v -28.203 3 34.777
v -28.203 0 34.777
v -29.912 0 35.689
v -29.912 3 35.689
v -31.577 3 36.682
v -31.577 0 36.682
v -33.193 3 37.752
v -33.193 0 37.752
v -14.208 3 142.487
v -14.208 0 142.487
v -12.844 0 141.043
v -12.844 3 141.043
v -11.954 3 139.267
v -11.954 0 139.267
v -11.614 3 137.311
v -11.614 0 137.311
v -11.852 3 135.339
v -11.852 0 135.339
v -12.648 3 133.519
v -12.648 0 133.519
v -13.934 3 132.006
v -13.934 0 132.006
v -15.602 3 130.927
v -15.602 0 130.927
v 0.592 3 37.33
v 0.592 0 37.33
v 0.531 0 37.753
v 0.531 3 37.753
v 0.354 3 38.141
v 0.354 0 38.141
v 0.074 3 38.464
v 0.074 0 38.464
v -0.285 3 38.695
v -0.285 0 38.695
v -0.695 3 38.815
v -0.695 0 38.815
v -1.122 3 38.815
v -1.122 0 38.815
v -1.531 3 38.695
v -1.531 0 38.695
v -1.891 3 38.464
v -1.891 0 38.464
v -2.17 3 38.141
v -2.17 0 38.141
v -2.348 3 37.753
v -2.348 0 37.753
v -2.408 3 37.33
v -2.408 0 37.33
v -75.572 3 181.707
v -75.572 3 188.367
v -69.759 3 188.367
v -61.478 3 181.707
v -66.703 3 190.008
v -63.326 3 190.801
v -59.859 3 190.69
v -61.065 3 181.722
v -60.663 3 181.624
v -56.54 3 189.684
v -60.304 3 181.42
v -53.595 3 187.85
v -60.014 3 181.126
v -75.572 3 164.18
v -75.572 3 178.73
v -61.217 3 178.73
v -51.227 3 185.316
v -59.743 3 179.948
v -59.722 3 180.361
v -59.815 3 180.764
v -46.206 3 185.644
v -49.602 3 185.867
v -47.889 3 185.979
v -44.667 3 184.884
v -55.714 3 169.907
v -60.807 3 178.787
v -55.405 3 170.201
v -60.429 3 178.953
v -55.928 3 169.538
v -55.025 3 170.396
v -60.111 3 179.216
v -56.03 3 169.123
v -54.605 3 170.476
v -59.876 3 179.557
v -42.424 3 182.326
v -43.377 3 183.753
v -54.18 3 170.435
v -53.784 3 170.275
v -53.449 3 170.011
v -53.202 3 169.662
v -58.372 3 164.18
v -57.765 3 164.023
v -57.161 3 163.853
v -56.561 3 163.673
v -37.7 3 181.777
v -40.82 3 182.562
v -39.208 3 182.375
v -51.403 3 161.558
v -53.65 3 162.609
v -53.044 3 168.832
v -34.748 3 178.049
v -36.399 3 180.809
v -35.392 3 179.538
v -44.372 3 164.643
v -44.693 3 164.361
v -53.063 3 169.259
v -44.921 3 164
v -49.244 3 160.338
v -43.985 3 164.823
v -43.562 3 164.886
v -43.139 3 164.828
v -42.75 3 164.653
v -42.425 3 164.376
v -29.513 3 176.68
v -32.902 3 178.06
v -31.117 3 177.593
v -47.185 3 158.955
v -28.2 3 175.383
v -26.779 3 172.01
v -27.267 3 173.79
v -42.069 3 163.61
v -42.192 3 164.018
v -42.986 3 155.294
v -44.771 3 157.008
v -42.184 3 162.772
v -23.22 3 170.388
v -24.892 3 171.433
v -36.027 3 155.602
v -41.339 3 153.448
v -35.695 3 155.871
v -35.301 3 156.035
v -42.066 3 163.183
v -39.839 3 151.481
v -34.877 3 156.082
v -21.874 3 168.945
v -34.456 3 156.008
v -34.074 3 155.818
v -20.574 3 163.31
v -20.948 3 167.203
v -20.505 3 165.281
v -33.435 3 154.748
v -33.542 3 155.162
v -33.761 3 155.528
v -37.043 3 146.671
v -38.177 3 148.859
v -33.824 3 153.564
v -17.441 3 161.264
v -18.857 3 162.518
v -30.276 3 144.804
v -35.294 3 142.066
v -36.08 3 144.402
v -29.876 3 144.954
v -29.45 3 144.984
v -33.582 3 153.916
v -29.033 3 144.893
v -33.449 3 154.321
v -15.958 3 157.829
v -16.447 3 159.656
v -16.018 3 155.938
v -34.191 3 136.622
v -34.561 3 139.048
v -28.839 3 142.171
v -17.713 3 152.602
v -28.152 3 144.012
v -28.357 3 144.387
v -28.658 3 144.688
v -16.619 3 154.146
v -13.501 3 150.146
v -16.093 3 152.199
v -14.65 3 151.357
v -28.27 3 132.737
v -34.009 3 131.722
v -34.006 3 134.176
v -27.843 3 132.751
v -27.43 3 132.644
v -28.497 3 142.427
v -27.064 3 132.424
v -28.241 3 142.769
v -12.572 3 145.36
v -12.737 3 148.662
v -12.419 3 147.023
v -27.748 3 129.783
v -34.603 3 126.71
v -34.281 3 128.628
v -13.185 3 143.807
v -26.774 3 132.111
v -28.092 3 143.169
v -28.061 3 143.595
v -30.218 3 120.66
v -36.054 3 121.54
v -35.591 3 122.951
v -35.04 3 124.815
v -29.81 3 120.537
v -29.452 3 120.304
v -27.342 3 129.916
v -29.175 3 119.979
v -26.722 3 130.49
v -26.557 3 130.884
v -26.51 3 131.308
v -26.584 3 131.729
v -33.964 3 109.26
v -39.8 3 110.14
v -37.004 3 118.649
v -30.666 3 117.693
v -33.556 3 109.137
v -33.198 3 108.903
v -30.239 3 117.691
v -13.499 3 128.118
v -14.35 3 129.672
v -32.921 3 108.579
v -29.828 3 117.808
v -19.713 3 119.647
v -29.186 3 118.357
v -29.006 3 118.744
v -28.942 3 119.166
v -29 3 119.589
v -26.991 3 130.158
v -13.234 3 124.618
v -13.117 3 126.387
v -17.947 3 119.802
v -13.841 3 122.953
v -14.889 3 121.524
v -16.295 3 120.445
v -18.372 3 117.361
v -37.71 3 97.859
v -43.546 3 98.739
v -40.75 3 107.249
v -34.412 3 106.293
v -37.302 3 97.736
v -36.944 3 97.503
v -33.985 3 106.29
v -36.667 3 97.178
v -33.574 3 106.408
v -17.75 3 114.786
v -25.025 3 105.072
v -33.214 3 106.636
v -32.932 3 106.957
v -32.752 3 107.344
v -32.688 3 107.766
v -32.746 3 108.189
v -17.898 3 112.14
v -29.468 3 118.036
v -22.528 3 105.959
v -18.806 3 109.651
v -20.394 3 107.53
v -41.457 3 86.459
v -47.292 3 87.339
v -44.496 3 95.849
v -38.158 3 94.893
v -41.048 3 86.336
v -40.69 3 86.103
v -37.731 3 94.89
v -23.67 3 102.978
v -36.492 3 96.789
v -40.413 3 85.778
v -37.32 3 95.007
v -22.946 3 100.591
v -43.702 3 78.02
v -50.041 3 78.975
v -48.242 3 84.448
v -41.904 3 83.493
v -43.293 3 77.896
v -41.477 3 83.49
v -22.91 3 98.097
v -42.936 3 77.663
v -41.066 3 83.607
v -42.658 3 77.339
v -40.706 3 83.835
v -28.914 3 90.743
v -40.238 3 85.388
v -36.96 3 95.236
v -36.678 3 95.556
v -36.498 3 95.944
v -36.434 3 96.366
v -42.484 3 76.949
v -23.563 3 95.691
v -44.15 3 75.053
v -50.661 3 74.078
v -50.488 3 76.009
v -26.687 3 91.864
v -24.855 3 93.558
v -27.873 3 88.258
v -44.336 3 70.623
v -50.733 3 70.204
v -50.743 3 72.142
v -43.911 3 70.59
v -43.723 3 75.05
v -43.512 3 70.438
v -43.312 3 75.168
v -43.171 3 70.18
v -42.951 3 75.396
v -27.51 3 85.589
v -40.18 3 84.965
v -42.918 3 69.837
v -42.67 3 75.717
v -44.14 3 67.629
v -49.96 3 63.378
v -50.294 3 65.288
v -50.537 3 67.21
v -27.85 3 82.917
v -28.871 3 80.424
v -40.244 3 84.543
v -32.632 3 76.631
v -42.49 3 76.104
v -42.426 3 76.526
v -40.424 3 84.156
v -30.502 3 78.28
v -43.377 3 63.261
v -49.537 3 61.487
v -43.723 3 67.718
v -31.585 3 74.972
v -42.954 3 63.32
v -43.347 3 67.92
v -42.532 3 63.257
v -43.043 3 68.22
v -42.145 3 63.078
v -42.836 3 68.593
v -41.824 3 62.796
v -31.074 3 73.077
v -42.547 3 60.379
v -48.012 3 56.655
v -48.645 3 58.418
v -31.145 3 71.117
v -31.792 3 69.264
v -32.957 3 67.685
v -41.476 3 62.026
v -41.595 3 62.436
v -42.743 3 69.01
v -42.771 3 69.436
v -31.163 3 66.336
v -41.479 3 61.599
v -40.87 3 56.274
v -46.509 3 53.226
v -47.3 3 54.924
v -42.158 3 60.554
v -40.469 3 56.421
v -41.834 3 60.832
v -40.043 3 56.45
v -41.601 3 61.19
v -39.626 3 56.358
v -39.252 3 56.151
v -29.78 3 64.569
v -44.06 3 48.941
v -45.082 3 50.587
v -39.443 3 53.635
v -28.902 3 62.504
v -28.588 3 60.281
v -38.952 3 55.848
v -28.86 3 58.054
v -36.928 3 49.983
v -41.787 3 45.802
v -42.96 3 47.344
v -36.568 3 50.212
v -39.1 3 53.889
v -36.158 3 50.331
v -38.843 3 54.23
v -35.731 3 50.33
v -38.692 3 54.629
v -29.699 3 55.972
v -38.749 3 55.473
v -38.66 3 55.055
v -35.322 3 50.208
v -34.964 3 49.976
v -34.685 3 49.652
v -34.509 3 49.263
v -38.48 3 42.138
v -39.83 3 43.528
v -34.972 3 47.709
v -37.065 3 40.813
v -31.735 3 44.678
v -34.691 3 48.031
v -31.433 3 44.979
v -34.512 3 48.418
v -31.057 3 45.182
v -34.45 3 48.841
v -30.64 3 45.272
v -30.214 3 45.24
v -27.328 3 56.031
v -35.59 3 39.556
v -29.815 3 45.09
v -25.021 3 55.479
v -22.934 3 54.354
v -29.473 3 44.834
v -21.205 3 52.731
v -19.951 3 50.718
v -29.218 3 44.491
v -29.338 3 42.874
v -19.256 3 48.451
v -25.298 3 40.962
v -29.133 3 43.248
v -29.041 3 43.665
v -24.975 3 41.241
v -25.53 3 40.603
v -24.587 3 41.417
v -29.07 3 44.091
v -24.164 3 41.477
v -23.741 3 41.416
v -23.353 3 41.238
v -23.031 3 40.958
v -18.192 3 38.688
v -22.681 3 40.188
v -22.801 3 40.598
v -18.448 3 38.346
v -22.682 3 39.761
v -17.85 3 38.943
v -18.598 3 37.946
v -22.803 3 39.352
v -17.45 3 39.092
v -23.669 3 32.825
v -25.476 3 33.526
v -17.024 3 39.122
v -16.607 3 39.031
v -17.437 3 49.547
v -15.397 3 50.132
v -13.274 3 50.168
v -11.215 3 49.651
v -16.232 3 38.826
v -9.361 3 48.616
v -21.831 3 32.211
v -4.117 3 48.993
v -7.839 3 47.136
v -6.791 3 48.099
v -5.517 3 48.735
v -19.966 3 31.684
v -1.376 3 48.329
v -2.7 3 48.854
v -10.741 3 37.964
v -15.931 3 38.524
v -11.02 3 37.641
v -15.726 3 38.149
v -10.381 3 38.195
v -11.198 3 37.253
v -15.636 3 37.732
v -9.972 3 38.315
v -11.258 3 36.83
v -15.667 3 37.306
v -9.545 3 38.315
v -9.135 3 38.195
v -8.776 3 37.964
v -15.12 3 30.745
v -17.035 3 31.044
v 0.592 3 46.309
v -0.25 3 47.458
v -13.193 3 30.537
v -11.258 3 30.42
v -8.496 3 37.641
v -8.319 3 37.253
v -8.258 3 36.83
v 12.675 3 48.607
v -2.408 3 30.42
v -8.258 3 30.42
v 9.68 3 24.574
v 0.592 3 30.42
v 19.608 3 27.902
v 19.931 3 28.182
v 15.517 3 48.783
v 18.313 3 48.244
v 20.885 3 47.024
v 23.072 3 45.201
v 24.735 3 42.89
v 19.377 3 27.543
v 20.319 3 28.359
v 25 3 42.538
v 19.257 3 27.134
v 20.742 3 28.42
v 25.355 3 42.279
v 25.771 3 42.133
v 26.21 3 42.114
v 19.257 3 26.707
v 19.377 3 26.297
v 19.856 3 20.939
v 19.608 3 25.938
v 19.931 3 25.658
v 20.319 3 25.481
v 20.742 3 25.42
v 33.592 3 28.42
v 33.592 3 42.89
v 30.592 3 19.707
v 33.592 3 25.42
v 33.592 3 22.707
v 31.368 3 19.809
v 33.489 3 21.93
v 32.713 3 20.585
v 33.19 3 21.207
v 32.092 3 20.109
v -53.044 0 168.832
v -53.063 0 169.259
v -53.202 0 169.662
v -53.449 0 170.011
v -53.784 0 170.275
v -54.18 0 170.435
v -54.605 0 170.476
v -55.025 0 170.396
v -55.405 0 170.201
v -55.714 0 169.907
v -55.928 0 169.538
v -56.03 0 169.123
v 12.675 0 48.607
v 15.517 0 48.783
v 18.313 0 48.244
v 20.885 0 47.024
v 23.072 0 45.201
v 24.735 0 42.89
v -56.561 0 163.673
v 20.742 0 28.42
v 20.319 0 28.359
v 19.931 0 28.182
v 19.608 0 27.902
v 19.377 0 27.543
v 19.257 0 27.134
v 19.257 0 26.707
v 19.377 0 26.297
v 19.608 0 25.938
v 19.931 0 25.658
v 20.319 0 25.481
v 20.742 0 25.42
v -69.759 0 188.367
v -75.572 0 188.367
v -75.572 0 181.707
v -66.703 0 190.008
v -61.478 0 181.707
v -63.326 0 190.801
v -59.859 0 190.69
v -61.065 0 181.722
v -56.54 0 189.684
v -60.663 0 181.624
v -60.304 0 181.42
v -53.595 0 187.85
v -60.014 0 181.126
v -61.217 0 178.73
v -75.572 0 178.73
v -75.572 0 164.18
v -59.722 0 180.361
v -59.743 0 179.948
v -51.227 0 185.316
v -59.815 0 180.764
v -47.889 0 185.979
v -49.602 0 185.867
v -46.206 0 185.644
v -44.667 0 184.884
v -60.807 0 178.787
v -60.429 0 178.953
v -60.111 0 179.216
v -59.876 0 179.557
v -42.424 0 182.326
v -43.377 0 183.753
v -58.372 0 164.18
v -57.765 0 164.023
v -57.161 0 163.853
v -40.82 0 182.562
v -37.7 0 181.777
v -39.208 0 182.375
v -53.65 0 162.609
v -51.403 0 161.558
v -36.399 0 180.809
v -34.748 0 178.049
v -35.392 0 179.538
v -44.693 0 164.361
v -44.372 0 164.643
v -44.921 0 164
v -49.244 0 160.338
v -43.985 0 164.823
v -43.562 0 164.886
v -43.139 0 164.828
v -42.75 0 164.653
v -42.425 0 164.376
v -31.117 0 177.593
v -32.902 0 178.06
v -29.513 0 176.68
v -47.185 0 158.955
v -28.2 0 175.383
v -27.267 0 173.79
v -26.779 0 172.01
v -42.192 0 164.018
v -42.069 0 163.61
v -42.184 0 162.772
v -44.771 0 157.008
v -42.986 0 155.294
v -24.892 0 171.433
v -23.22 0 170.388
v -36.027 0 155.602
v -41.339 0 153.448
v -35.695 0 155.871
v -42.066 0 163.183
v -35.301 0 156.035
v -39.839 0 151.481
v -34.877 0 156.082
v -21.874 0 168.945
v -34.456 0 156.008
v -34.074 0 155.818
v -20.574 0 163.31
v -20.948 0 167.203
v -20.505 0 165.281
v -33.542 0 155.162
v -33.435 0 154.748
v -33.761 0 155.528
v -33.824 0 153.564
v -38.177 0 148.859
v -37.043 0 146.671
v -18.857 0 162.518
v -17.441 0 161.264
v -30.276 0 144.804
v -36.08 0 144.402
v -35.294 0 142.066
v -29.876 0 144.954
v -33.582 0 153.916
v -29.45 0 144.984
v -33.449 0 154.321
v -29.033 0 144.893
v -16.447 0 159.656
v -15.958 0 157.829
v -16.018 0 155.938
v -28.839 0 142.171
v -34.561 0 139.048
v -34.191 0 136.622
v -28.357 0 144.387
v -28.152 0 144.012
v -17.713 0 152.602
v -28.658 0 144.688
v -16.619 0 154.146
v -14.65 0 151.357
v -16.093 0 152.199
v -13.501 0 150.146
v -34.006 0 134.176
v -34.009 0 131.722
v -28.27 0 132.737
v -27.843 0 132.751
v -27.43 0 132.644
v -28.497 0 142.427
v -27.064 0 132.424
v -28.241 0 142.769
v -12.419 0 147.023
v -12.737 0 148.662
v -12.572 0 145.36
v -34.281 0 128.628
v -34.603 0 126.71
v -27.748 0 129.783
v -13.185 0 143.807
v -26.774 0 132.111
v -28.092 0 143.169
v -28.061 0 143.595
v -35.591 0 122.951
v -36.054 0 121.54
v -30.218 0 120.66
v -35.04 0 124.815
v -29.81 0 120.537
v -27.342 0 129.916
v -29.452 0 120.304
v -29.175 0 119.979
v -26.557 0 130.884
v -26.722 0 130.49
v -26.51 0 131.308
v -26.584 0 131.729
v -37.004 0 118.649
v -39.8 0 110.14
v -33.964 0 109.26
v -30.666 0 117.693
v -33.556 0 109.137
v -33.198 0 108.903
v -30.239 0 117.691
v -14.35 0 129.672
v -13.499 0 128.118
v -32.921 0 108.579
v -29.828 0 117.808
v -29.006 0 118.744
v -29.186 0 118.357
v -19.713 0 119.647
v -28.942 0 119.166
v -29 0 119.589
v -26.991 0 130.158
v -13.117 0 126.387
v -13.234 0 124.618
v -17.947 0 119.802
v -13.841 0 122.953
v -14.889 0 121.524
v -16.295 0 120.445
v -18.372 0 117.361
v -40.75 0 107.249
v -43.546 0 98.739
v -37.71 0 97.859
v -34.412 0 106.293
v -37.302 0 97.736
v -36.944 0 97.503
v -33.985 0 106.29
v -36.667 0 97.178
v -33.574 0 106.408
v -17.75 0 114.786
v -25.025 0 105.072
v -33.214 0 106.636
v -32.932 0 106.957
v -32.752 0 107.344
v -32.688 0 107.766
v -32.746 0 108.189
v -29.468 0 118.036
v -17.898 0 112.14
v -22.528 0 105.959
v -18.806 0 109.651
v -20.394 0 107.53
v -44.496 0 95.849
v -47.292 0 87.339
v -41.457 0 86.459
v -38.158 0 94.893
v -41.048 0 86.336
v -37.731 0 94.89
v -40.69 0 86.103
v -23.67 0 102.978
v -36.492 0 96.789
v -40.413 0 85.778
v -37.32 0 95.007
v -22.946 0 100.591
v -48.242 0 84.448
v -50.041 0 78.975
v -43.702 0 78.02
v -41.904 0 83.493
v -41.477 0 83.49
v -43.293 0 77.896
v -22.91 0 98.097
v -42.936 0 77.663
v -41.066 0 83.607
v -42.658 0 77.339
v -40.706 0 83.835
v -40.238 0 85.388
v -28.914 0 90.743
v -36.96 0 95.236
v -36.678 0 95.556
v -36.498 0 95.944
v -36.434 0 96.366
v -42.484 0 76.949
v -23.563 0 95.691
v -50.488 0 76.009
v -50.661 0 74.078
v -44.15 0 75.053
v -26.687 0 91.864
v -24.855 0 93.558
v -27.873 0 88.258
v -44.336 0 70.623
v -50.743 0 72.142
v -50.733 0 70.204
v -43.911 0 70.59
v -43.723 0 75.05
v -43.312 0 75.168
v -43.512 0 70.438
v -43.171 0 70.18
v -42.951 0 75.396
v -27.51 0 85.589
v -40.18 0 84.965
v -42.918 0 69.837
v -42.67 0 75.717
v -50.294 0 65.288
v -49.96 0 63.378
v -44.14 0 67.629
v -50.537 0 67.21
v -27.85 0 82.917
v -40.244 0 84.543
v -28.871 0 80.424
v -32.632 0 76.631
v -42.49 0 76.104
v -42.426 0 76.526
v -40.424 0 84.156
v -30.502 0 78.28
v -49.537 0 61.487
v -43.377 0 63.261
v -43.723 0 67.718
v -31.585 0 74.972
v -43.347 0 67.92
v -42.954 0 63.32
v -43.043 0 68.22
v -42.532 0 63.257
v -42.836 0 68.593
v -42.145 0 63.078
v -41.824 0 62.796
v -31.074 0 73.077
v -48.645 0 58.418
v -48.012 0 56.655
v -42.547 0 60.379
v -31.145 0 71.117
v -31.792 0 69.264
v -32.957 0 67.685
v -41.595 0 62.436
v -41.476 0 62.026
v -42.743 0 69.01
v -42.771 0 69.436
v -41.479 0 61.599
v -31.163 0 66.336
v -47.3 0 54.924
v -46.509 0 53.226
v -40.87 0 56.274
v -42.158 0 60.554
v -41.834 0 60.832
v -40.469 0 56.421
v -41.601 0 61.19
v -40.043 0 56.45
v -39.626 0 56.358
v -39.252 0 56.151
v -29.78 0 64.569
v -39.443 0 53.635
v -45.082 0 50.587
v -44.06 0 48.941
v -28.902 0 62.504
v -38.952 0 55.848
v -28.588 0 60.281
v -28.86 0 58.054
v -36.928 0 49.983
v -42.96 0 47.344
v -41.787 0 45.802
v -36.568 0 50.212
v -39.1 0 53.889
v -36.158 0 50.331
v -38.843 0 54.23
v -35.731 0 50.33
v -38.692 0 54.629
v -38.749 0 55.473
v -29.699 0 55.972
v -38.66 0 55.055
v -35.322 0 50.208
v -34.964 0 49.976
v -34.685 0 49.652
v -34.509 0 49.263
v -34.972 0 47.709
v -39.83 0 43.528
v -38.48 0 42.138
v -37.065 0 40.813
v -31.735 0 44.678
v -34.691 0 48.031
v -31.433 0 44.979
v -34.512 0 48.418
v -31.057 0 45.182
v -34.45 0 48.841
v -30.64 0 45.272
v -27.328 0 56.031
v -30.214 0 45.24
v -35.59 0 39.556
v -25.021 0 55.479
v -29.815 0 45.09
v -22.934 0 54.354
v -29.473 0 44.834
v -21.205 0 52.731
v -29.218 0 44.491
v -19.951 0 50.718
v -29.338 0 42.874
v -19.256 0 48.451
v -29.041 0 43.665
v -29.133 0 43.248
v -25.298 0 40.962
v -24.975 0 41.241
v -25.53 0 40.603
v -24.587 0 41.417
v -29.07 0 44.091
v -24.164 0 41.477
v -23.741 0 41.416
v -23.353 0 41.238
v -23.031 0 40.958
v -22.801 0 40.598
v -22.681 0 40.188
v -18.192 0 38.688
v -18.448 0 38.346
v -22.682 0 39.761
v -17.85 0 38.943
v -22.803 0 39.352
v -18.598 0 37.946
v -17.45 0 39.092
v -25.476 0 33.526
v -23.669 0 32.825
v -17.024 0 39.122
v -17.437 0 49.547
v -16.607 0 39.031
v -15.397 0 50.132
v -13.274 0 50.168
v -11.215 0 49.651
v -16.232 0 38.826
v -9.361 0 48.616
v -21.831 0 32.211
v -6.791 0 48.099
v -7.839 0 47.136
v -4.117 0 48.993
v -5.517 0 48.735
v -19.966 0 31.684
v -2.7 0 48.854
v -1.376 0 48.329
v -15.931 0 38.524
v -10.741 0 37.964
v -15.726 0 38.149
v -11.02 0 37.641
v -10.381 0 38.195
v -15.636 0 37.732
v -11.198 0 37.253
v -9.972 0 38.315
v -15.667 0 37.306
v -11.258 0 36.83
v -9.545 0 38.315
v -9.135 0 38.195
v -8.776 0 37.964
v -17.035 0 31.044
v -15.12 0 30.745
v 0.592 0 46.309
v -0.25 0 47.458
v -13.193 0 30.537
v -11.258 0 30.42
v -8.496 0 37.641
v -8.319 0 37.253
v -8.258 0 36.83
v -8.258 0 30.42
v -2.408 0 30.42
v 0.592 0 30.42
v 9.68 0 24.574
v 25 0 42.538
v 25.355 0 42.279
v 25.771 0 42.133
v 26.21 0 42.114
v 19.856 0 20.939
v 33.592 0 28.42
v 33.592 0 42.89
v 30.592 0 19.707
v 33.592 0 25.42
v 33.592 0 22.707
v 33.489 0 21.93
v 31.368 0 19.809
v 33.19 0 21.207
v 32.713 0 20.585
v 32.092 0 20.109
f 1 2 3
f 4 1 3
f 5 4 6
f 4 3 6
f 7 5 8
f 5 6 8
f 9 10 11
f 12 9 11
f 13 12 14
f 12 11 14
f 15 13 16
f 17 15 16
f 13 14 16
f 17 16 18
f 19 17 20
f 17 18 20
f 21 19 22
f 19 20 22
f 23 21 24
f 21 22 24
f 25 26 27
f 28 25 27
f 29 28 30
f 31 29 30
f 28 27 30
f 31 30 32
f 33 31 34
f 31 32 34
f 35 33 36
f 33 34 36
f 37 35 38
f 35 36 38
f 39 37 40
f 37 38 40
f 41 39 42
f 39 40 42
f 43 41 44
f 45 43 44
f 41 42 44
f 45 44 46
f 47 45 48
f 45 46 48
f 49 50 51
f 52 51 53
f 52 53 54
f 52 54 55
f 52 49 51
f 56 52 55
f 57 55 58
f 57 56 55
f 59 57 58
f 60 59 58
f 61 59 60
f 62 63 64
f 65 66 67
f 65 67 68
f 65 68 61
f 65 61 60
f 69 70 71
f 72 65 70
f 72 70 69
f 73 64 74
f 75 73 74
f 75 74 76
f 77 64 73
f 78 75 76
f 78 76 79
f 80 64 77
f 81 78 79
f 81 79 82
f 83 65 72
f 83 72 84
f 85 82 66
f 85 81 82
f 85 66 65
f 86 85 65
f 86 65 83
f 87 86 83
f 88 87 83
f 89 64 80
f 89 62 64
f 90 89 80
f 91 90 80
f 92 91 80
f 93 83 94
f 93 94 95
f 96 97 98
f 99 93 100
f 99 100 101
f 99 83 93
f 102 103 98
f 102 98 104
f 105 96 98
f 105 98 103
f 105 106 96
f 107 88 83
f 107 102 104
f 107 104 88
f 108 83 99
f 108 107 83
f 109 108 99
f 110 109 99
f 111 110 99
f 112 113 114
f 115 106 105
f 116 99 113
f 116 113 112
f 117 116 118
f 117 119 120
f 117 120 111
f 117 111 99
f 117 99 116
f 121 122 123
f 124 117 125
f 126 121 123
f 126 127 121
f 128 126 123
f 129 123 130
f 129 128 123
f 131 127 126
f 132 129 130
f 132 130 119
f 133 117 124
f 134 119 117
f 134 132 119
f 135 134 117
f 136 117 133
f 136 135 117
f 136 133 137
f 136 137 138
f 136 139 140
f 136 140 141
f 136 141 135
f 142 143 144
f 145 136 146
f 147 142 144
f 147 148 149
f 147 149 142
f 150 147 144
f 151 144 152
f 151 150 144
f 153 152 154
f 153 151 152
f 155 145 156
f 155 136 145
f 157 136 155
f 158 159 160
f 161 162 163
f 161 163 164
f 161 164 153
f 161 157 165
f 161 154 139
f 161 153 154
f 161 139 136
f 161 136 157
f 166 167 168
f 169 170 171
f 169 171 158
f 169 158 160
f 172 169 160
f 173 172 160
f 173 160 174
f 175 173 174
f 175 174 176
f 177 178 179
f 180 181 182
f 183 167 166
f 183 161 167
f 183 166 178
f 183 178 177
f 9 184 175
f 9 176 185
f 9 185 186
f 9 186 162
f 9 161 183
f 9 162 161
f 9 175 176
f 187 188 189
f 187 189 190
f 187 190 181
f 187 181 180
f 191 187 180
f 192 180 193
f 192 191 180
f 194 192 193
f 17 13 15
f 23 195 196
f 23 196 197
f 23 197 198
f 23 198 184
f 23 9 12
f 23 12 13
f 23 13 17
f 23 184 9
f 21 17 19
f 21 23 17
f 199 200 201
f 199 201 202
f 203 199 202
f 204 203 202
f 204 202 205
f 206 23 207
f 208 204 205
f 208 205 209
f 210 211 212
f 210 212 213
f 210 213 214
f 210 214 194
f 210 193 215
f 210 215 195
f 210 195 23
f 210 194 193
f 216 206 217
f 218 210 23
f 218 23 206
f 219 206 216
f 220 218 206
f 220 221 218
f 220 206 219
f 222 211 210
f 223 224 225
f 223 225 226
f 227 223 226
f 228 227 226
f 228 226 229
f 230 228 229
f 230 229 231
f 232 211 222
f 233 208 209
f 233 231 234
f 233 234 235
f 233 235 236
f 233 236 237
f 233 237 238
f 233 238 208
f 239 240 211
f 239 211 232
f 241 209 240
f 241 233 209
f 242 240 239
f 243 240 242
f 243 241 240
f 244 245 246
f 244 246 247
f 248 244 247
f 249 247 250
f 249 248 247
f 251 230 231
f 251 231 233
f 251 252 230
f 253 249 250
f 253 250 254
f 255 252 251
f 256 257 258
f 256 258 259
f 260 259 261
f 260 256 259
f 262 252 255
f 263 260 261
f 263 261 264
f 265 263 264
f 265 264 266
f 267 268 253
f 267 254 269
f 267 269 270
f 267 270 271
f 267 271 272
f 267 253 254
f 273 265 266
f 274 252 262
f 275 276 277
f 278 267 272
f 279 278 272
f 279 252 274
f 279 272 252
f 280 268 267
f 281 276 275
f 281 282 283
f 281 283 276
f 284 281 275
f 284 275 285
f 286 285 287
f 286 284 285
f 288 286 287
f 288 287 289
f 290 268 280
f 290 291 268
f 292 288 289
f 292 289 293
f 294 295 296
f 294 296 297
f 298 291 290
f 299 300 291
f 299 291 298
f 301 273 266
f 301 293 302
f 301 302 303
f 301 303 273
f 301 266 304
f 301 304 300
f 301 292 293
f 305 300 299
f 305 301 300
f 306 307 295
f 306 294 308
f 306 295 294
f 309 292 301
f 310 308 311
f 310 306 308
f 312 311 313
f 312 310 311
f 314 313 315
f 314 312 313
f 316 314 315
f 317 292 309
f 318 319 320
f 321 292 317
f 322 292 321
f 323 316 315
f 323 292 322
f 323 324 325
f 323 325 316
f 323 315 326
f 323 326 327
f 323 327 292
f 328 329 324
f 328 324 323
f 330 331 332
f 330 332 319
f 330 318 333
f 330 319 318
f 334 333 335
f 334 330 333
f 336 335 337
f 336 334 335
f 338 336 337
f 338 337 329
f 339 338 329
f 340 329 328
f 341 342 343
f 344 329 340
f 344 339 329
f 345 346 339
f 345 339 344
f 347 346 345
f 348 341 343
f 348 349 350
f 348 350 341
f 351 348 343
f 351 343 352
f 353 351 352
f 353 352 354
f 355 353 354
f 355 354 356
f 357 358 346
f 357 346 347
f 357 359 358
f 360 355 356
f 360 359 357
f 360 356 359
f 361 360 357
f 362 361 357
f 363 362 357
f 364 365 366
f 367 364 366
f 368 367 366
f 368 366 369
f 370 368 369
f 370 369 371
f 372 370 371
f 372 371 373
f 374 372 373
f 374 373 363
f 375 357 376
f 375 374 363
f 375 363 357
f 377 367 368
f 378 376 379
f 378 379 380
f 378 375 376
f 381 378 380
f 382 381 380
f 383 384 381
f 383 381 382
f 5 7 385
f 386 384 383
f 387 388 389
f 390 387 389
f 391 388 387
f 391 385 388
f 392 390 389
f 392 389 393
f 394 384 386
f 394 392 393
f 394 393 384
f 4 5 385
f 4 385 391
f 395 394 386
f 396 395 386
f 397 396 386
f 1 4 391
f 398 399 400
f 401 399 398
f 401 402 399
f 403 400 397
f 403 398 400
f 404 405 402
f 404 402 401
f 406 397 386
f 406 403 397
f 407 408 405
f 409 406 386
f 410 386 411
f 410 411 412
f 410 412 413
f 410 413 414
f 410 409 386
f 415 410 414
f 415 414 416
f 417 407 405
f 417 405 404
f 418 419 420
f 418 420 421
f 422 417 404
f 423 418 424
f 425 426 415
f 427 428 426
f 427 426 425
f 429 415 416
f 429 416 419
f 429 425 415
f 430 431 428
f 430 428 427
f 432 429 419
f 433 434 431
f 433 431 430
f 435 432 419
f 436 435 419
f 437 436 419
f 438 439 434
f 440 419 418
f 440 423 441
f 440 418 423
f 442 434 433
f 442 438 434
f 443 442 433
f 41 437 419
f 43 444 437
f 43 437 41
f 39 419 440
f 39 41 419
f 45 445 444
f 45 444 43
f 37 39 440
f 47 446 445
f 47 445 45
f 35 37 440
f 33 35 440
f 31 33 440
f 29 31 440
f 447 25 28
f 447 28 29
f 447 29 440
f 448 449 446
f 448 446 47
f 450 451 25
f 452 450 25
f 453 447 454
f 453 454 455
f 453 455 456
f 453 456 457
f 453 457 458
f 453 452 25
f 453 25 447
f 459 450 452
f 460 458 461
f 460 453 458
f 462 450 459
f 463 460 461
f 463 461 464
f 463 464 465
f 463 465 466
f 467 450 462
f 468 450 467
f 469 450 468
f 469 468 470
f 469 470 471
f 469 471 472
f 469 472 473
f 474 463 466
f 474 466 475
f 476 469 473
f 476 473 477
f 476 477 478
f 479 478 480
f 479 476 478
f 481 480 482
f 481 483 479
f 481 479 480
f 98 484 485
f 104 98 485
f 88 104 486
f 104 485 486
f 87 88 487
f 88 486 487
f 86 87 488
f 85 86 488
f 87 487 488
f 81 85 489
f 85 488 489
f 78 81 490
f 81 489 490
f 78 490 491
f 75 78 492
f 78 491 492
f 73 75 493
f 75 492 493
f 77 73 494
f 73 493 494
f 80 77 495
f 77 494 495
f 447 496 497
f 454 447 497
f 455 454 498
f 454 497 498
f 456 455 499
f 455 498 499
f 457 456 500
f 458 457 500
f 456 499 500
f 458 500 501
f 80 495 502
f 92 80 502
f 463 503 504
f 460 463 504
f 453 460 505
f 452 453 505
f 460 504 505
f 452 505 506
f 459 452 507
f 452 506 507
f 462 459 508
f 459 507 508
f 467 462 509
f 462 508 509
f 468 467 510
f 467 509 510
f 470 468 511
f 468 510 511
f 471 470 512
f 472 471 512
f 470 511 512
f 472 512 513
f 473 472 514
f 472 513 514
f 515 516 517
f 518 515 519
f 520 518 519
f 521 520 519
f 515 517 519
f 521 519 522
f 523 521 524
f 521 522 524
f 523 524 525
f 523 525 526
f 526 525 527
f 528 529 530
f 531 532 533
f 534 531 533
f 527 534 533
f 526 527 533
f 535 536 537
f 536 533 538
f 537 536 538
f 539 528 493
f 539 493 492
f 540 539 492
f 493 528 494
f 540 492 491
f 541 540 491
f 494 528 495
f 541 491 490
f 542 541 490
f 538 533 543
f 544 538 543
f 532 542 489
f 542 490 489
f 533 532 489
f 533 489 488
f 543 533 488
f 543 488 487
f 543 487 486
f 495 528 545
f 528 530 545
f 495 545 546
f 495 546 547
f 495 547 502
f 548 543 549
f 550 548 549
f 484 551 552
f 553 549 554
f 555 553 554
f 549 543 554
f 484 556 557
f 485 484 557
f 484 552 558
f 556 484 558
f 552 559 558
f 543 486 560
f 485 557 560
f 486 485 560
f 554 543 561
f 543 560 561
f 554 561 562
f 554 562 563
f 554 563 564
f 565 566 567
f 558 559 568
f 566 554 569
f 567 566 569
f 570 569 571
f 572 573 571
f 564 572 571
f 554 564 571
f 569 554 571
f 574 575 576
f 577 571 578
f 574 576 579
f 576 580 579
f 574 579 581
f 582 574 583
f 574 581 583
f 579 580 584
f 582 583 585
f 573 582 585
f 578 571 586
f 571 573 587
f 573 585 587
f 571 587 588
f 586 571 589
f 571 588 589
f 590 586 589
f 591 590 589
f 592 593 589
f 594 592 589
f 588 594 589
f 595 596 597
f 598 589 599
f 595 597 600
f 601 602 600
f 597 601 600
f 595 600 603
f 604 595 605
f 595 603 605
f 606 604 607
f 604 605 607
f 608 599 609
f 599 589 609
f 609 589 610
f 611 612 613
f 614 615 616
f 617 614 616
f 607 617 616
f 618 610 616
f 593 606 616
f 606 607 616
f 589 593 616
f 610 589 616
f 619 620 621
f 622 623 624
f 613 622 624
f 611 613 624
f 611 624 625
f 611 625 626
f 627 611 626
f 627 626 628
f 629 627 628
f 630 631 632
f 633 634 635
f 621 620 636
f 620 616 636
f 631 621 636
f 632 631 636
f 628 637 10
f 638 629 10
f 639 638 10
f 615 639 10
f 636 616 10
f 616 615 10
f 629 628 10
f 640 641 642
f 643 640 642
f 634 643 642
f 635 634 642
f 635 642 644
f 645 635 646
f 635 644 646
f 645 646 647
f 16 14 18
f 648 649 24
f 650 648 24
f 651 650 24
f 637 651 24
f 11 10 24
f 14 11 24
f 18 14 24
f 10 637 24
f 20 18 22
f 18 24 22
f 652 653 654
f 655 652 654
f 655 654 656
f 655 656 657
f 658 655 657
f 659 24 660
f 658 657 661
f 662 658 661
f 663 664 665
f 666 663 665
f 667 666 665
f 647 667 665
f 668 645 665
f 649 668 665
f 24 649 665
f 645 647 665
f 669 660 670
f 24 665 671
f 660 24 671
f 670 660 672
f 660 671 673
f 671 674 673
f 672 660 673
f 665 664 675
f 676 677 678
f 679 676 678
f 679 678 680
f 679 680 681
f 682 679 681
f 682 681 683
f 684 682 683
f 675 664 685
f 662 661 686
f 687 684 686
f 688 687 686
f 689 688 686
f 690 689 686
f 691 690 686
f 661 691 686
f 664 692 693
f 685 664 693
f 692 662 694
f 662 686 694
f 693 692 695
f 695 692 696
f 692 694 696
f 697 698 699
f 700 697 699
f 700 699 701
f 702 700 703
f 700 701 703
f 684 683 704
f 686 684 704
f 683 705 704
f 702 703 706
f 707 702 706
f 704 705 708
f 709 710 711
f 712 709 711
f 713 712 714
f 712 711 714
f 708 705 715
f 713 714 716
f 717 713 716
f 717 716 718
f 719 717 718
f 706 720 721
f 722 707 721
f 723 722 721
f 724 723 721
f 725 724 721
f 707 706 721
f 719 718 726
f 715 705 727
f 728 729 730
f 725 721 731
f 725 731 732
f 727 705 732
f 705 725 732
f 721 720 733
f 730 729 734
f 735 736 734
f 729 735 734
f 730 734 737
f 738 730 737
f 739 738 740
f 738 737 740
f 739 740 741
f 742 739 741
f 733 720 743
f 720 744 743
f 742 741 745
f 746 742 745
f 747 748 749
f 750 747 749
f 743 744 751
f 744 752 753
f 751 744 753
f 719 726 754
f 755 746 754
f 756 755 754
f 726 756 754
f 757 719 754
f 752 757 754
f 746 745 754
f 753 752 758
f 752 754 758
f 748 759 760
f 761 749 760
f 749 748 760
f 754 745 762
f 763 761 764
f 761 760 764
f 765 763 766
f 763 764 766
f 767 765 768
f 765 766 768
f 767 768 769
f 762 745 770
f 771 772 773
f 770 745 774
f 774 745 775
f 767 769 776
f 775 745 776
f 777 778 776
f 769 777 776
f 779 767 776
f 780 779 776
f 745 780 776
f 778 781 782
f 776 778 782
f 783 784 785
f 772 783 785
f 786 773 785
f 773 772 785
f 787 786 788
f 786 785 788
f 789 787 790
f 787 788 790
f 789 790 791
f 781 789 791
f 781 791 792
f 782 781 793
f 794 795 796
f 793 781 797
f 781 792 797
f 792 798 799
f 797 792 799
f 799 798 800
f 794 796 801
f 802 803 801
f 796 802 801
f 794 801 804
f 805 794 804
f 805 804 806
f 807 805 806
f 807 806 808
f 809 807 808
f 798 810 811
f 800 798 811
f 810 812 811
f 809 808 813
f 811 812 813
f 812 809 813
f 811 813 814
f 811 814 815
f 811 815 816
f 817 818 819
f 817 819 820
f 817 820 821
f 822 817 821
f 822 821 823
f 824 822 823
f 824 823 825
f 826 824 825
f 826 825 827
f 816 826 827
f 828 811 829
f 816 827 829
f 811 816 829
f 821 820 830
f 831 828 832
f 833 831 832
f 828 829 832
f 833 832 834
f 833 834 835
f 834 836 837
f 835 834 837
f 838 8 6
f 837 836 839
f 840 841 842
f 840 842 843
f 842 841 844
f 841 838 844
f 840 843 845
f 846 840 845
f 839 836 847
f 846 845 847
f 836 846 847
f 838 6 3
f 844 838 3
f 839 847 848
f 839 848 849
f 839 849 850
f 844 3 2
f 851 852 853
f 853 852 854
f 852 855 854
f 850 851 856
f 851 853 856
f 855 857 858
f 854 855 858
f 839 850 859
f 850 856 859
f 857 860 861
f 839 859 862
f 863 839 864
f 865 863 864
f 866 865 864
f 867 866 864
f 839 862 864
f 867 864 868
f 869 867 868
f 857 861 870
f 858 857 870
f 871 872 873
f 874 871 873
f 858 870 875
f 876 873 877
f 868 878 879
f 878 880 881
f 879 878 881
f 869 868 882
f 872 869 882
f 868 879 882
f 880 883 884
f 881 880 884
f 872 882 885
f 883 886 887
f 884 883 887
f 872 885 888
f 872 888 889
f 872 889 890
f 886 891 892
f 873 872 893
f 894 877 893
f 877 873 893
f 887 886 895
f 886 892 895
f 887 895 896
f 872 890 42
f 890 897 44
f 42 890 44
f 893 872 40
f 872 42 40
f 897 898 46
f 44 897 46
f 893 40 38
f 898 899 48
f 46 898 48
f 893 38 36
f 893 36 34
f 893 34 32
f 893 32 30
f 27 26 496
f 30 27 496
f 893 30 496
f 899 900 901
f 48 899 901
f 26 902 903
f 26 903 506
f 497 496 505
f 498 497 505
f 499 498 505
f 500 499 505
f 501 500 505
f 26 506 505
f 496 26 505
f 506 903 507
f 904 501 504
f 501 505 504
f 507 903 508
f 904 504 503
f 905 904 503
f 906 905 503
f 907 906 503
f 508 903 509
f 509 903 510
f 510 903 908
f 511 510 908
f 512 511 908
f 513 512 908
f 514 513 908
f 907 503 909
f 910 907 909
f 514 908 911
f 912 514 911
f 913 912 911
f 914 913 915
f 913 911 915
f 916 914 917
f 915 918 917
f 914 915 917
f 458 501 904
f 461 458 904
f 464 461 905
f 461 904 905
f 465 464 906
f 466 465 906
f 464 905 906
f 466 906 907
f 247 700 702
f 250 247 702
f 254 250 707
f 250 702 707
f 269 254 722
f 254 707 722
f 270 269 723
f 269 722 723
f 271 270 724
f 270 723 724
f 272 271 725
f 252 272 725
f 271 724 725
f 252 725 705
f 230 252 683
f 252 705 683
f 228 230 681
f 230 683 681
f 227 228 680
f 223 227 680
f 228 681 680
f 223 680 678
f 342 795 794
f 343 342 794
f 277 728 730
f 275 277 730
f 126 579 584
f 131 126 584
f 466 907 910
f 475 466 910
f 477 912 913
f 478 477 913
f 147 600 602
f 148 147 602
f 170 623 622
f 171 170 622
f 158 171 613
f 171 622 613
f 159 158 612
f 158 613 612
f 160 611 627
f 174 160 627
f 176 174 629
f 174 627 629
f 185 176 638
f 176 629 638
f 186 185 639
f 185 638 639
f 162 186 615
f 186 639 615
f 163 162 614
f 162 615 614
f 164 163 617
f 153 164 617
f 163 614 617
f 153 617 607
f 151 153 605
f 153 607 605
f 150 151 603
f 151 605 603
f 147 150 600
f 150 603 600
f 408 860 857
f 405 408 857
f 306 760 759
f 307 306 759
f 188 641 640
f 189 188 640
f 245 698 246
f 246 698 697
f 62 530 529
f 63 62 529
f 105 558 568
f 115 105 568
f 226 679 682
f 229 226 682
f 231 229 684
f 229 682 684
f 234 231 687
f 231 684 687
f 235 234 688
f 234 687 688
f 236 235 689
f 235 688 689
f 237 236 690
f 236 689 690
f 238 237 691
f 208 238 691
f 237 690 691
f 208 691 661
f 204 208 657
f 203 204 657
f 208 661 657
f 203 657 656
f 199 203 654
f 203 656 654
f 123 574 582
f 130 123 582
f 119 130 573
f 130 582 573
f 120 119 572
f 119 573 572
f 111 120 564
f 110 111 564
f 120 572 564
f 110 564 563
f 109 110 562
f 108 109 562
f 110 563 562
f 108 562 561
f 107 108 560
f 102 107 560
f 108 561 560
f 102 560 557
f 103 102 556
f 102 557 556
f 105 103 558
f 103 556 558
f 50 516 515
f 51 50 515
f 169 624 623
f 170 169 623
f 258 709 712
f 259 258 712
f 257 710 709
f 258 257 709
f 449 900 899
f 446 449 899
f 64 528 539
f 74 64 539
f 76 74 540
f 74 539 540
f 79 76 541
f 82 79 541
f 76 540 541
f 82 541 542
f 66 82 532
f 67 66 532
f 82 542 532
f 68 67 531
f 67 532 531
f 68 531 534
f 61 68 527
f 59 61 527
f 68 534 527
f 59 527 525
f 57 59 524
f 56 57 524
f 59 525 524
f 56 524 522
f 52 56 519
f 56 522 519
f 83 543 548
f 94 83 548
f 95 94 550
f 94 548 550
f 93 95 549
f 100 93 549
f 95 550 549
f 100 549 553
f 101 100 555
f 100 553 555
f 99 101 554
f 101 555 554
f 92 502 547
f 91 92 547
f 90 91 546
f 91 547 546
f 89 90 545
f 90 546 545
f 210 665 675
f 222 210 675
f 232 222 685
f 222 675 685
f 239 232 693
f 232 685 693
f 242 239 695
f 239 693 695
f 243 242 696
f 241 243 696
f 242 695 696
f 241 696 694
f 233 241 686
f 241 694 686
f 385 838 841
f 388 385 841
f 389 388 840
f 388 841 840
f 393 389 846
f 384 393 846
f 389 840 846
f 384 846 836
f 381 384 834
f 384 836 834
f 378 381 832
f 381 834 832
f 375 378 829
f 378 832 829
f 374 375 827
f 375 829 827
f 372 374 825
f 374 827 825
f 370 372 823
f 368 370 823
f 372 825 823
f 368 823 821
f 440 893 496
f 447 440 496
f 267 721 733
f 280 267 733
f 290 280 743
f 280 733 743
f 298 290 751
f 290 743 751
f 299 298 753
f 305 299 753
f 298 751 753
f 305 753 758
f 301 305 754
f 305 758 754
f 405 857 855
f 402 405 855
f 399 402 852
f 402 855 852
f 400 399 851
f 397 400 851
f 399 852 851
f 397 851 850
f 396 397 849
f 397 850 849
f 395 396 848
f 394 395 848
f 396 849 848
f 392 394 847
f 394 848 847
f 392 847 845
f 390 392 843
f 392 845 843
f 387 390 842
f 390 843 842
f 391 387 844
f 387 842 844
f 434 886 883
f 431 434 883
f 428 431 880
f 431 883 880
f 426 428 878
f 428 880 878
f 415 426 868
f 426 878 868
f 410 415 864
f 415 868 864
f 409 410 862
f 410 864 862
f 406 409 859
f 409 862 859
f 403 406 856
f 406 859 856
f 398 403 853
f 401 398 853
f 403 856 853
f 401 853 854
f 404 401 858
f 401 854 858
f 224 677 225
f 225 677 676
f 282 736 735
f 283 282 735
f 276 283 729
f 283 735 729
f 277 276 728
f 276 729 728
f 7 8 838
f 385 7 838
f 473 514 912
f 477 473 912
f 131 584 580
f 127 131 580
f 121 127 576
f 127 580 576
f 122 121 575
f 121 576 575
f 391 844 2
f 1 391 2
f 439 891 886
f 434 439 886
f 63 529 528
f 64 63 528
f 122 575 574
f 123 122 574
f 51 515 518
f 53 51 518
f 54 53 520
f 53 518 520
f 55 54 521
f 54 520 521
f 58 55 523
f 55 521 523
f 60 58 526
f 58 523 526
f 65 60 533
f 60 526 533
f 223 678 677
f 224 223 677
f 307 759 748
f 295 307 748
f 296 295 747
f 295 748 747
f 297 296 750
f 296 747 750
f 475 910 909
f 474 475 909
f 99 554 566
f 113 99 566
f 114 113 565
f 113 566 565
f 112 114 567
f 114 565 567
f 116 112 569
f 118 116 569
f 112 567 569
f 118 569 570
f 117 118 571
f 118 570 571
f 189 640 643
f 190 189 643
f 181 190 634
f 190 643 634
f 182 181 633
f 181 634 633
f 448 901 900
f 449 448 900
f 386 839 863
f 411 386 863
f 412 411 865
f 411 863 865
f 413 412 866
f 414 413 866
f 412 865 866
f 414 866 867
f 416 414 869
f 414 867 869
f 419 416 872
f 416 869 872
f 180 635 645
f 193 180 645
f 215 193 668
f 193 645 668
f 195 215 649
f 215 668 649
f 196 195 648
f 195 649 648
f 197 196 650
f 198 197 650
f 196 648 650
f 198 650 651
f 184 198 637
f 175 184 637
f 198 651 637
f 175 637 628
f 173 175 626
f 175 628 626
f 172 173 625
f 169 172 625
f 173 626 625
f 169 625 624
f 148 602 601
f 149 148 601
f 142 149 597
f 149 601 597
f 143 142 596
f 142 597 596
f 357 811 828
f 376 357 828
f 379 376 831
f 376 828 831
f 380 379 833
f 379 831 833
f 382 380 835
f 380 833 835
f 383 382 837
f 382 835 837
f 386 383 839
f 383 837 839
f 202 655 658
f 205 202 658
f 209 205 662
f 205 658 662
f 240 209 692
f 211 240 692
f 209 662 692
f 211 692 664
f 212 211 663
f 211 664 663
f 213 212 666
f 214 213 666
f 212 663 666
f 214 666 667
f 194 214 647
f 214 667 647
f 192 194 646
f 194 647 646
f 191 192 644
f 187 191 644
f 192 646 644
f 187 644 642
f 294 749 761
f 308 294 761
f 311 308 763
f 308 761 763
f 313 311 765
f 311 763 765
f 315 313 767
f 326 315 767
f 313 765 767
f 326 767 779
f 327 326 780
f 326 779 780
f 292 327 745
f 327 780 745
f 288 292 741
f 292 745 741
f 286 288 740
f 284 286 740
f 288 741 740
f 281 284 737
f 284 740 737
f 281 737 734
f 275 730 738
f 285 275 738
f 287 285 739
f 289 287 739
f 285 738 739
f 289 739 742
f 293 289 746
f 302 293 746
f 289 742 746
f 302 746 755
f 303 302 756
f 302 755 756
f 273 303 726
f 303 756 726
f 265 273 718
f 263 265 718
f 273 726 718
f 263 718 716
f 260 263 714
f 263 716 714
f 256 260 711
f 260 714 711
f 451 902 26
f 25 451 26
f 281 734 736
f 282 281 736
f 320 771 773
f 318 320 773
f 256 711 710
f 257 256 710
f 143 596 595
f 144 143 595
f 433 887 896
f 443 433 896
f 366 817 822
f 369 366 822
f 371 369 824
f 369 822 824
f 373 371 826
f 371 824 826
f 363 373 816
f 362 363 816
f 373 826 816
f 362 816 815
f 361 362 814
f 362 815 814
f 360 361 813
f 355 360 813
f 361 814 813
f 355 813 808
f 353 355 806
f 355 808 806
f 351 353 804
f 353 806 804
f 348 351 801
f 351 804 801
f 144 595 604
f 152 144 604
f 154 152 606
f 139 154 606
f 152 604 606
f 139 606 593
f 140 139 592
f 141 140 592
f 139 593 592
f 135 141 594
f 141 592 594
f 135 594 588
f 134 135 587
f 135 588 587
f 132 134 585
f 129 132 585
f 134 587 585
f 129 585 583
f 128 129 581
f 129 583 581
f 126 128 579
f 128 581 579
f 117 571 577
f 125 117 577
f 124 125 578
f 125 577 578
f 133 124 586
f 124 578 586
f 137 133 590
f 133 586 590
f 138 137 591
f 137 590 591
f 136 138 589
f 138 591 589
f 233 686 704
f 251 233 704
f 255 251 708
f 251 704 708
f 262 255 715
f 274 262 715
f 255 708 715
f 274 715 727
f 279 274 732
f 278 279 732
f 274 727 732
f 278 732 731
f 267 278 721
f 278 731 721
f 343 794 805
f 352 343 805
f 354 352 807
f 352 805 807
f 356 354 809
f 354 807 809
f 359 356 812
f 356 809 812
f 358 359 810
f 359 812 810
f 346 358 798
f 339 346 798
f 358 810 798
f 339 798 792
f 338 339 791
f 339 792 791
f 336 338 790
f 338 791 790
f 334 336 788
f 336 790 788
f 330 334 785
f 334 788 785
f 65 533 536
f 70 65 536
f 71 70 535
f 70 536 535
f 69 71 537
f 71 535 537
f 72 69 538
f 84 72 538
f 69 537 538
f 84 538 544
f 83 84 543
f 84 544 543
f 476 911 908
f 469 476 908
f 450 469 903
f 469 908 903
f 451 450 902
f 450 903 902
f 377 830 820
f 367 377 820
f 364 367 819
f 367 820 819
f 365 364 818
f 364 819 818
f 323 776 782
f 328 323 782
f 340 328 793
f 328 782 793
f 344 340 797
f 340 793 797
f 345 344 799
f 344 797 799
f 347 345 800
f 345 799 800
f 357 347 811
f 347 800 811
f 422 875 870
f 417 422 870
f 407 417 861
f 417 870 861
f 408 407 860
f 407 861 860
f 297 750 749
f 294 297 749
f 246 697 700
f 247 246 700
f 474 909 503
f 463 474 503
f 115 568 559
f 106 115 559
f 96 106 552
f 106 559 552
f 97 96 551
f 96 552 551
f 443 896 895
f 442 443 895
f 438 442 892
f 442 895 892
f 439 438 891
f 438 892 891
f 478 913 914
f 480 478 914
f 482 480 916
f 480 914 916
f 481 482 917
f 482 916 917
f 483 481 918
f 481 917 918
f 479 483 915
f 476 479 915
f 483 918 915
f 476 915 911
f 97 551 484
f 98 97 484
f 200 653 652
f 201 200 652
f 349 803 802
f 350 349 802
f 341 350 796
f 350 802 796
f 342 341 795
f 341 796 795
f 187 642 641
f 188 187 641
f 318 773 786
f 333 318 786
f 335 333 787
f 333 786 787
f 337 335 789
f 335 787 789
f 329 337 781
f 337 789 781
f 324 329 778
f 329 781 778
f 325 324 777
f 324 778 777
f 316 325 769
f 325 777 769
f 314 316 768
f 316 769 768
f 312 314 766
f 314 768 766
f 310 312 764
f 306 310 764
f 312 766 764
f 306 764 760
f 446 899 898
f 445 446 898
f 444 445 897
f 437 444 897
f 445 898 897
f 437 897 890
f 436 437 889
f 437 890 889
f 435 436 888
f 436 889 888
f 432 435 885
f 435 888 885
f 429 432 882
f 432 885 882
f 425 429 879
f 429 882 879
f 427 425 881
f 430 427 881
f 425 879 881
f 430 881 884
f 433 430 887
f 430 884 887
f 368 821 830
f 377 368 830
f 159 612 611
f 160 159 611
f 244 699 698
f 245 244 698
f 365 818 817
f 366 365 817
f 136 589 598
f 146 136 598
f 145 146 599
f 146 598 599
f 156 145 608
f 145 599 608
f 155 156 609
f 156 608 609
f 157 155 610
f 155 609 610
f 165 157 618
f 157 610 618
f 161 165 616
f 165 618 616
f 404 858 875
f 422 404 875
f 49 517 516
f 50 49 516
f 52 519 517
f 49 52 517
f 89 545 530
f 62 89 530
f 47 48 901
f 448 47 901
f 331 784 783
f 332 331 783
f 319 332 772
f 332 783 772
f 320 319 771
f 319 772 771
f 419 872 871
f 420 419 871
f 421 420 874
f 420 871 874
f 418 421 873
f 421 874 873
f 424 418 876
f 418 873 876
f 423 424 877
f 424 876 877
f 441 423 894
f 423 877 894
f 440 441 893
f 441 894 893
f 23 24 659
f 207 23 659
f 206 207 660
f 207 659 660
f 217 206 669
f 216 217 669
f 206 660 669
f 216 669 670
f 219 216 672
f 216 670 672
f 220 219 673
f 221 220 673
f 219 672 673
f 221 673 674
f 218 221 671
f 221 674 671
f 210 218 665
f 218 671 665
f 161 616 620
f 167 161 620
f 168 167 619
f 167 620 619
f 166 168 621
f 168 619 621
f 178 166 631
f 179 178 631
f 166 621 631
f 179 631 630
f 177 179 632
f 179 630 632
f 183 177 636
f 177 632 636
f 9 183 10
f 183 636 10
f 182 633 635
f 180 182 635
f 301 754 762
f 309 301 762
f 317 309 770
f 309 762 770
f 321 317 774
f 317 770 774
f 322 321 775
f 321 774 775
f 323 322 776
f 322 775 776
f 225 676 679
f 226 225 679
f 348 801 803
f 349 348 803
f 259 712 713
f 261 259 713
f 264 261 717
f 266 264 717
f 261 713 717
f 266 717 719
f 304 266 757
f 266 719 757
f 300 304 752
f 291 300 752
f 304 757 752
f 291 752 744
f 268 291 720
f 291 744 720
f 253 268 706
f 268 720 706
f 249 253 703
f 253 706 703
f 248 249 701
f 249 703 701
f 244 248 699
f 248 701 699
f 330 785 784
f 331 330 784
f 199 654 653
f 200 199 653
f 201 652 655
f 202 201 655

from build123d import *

# Parameters (mm, degrees)
BOSS_EXTRUDE1_DEPTH = 3


with BuildPart() as part:
    # Sketch3 → Boss-Extrude1 (new body)
    with BuildSketch(Plane(origin=(0, 0, 0), x_dir=(1, 0, 0), z_dir=(0, 1, 0))):
        with BuildLine():
            Line((0.591679445, -30.420098318), (0.591679445, -37.330098318))
            ThreePointArc((0.591679445, -37.330098318), (-0.908320555, -38.830098318), (-2.408320555, -37.330098318))
            Line((-2.408320555, -37.330098318), (-2.408320555, -30.420098318))
            Line((-2.408320555, -30.420098318), (-8.258320555, -30.420098318))
            Line((-8.258320555, -30.420098318), (-8.258320555, -36.830098318))
            ThreePointArc((-8.258320555, -36.830098318), (-9.758320555, -38.330098318), (-11.258320555, -36.830098318))
            Line((-11.258320555, -36.830098318), (-11.258320555, -30.420098318))
            ThreePointArc((-11.258320555, -30.420098318), (-14.157587017, -30.629396859), (-17.034731178, -31.04363517))
            Line((-17.034731178, -31.04363517), (-15.66681067, -37.305974468))
            ThreePointArc((-15.66681067, -37.305974468), (-16.812150481, -39.091526685), (-18.597702697, -37.946186875))
            Line((-18.597702697, -37.946186875), (-19.965623205, -31.683847576))
            ThreePointArc((-19.965623205, -31.683847576), (-22.753437017, -32.507040171), (-25.475903143, -33.525730554))
            Line((-25.475903143, -33.525730554), (-22.803084936, -39.351890767))
            ThreePointArc((-22.803084936, -39.351890767), (-23.540996482, -41.340731271), (-25.529836986, -40.602819725))
            Line((-25.529836986, -40.602819725), (-28.202655193, -34.776659512))
            ThreePointArc((-28.202655193, -34.776659512), (-30.750576247, -36.175820045), (-33.192934927, -37.752029415))
            Line((-33.192934927, -37.752029415), (-29.338361053, -42.873587796))
            ThreePointArc((-29.338361053, -42.873587796), (-29.634847287, -44.974086764), (-31.735346255, -44.67760053))
            Line((-31.735346255, -44.67760053), (-35.589920129, -39.556042149))
            ThreePointArc((-35.589920129, -39.556042149), (-37.780560653, -41.466708522), (-39.830287583, -43.52781779))
            Line((-39.830287583, -43.52781779), (-34.9715459, -47.708813994))
            ThreePointArc((-34.9715459, -47.708813994), (-34.812947114, -49.824197275), (-36.928330395, -49.982796061))
            Line((-36.928330395, -49.982796061), (-41.787072078, -45.801799857))
            ThreePointArc((-41.787072078, -45.801799857), (-43.519504922, -48.135943884), (-45.082165119, -50.586993661))
            Line((-45.082165119, -50.586993661), (-39.443107485, -53.634800906))
            ThreePointArc((-39.443107485, -53.634800906), (-38.836730639, -55.6676086), (-40.869538333, -56.273985446))
            Line((-40.869538333, -56.273985446), (-46.508595967, -53.226178201))
            ThreePointArc((-46.508595967, -53.226178201), (-47.665748765, -55.785413628), (-48.644932096, -58.417881781))
            Line((-48.644932096, -58.417881781), (-42.547032105, -60.378526572))
            ThreePointArc((-42.547032105, -60.378526572), (-41.520814182, -62.235103199), (-43.37739081, -63.261321122))
            Line((-43.37739081, -63.261321122), (-49.536961833, -61.487121356))
            ThreePointArc((-49.536961833, -61.487121356), (-50.138317317, -64.33104883), (-50.536616569, -67.210442795))
            Line((-50.536616569, -67.210442795), (-44.140315801, -67.629294183))
            ThreePointArc((-44.140315801, -67.629294183), (-42.741536695, -69.22410358), (-44.336346092, -70.622882686))
            Line((-44.336346092, -70.622882686), (-50.73264686, -70.204031298))
            ThreePointArc((-50.73264686, -70.204031298), (-50.713243641, -73.110777832), (-50.487893094, -76.008840811))
            Line((-50.487893094, -76.008840811), (-44.149552834, -75.053046508))
            ThreePointArc((-44.149552834, -75.053046508), (-42.442657071, -76.312612644), (-43.702223207, -78.019508408))
            Line((-43.702223207, -78.019508408), (-50.040563467, -78.975302711))
            Line((-50.040563467, -78.975302711), (-48.242175426, -84.448330276))
            Line((-48.242175426, -84.448330276), (-41.903835167, -83.492535972))
            ThreePointArc((-41.903835167, -83.492535972), (-40.196939403, -84.752102109), (-41.456505539, -86.458997873))
            Line((-41.456505539, -86.458997873), (-47.292325887, -87.339014346))
            Line((-47.292325887, -87.339014346), (-44.496146078, -95.848648873))
            Line((-44.496146078, -95.848648873), (-38.157805818, -94.89285457))
            ThreePointArc((-38.157805818, -94.89285457), (-36.450910055, -96.152420706), (-37.710476191, -97.85931647))
            Line((-37.710476191, -97.85931647), (-43.546296539, -98.739332944))
            Line((-43.546296539, -98.739332944), (-40.75011673, -107.248967471))
            Line((-40.75011673, -107.248967471), (-34.41177647, -106.293173167))
            ThreePointArc((-34.41177647, -106.293173167), (-32.704880706, -107.552739304), (-33.964446843, -109.259635067))
            Line((-33.964446843, -109.259635067), (-39.800267191, -110.139651541))
            Line((-39.800267191, -110.139651541), (-37.004087382, -118.649286068))
            Line((-37.004087382, -118.649286068), (-30.665747122, -117.693491765))
            ThreePointArc((-30.665747122, -117.693491765), (-28.958851358, -118.953057901), (-30.218417495, -120.659953665))
            Line((-30.218417495, -120.659953665), (-36.054237843, -121.539970138))
            Line((-36.054237843, -121.539970138), (-35.590669818, -122.95075011))
            ThreePointArc((-35.590669818, -122.95075011), (-34.806974696, -125.75946708), (-34.281042725, -128.627648207))
            Line((-34.281042725, -128.627648207), (-27.747875517, -129.78272529))
            ThreePointArc((-27.747875517, -129.78272529), (-26.531936776, -131.520969513), (-28.270180998, -132.736908254))
            Line((-28.270180998, -132.736908254), (-34.00913019, -131.722250511))
            ThreePointArc((-34.00913019, -131.722250511), (-34.075192309, -135.400732769), (-34.561150831, -139.04757253))
            Line((-34.561150831, -139.04757253), (-28.838758854, -142.17116811))
            ThreePointArc((-28.838758854, -142.17116811), (-28.240821524, -144.206474217), (-30.276127631, -144.804411546))
            Line((-30.276127631, -144.804411546), (-35.2935191, -142.065643934))
            ThreePointArc((-35.2935191, -142.065643934), (-36.539745877, -145.545336545), (-38.177184694, -148.858965366))
            Line((-38.177184694, -148.858965366), (-33.824418851, -153.564444036))
            ThreePointArc((-33.824418851, -153.564444036), (-33.906956954, -155.68415804), (-36.026670958, -155.601619937))
            Line((-36.026670958, -155.601619937), (-39.838521376, -151.480888091))
            ThreePointArc((-39.838521376, -151.480888091), (-42.144817333, -154.387016255), (-44.770614017, -157.008041575))
            Line((-44.770614017, -157.008041575), (-42.183941003, -162.772154464))
            ThreePointArc((-42.183941003, -162.772154464), (-42.938330746, -164.754803226), (-44.920979509, -164.000413483))
            Line((-44.920979509, -164.000413483), (-47.185290179, -158.954649194))
            ThreePointArc((-47.185290179, -158.954649194), (-50.311989567, -160.96907207), (-53.650455908, -162.608825429))
            Line((-53.650455908, -162.608825429), (-53.043901057, -168.832254262))
            ThreePointArc((-53.043901057, -168.832254262), (-54.391321871, -170.470685569), (-56.029753178, -169.123264755))
            Line((-56.029753178, -169.123264755), (-56.560978983, -163.672733804))
            ThreePointArc((-56.560978983, -163.672733804), (-57.462718747, -163.939470451), (-58.371875015, -164.179715994))
            Line((-58.371875015, -164.179715994), (-75.571875015, -164.179715994))
            Line((-75.571875015, -164.179715994), (-75.571875015, -178.729715994))
            Line((-75.571875015, -178.729715994), (-61.216696476, -178.729715994))
            ThreePointArc((-61.216696476, -178.729715994), (-59.722431212, -180.360755387), (-61.477773293, -181.706820898))
            Line((-61.477773293, -181.706820898), (-75.571875015, -181.706820898))
            Line((-75.571875015, -181.706820898), (-75.571875015, -188.366820898))
            Line((-75.571875015, -188.366820898), (-69.758711754, -188.366820898))
            ThreePointArc((-69.758711754, -188.366820898), (-59.859029923, -190.690063204), (-51.226648029, -185.315759714))
            ThreePointArc((-51.226648029, -185.315759714), (-46.206239367, -185.643710412), (-42.424378195, -182.325641566))
            ThreePointArc((-42.424378195, -182.325641566), (-37.700409933, -181.777039638), (-34.747980084, -178.048769502))
            ThreePointArc((-34.747980084, -178.048769502), (-29.512633217, -176.679893654), (-26.778625341, -172.010002988))
            ThreePointArc((-26.778625341, -172.010002988), (-21.874415441, -168.945099351), (-20.57382951, -163.310085129))
            ThreePointArc((-20.57382951, -163.310085129), (-16.135510008, -158.759996314), (-17.712581879, -152.602494179))
            ThreePointArc((-17.712581879, -152.602494179), (-12.736952388, -148.661636396), (-14.20790203, -142.487208808))
            ThreePointArc((-14.20790203, -142.487208808), (-11.660768143, -136.316062867), (-15.601751117, -130.927223803))
            ThreePointArc((-15.601751117, -130.927223803), (-13.478300165, -123.764089753), (-19.712761754, -119.646927859))
            ThreePointArc((-19.712761754, -119.646927859), (-18.260622737, -110.862232301), (-25.024542476, -105.071811459))
            ThreePointArc((-25.024542476, -105.071811459), (-23.152070063, -96.871086954), (-28.913917519, -90.742534985))
            ThreePointArc((-28.913917519, -90.742534985), (-27.85022737, -82.916745733), (-32.6317535, -76.630934567))
            ThreePointArc((-32.6317535, -76.630934567), (-31.035937746, -72.094286151), (-32.956658516, -67.685359014))
            ThreePointArc((-32.956658516, -67.685359014), (-28.901785775, -62.503538673), (-29.698658066, -55.972210359))
            ThreePointArc((-29.698658066, -55.972210359), (-22.933977183, -54.354119985), (-19.255807876, -48.450714658))
            ThreePointArc((-19.255807876, -48.450714658), (-13.273954555, -50.167914793), (-7.839177287, -47.135664555))
            ThreePointArc((-7.839177287, -47.135664555), (-3.40315163, -48.973344156), (0.591679445, -46.309378199))
            Line((0.591679445, -46.309378199), (12.675221537, -48.606938304))
            ThreePointArc((12.675221537, -48.606938304), (19.637576869, -47.715252301), (24.735359205, -42.890098318))
            ThreePointArc((24.735359205, -42.890098318), (25.355154173, -42.278520936), (26.210254983, -42.114279345))
            Line((26.210254983, -42.114279345), (33.591679445, -42.890098318))
            Line((33.591679445, -42.890098318), (33.591679445, -28.420098318))
            Line((33.591679445, -28.420098318), (20.741679445, -28.420098318))
            ThreePointArc((20.741679445, -28.420098318), (19.241679445, -26.920098318), (20.741679445, -25.420098318))
            Line((20.741679445, -25.420098318), (33.591679445, -25.420098318))
            Line((33.591679445, -25.420098318), (33.591679445, -22.706623157))
            ThreePointArc((33.591679445, -22.706623157), (32.712999789, -20.585302814), (30.591679445, -19.706623157))
            ThreePointArc((30.591679445, -19.706623157), (14.663884949, -22.465339604), (0.591679445, -30.420098318))
        make_face()
    extrude(amount=BOSS_EXTRUDE1_DEPTH)


solid = part.part
